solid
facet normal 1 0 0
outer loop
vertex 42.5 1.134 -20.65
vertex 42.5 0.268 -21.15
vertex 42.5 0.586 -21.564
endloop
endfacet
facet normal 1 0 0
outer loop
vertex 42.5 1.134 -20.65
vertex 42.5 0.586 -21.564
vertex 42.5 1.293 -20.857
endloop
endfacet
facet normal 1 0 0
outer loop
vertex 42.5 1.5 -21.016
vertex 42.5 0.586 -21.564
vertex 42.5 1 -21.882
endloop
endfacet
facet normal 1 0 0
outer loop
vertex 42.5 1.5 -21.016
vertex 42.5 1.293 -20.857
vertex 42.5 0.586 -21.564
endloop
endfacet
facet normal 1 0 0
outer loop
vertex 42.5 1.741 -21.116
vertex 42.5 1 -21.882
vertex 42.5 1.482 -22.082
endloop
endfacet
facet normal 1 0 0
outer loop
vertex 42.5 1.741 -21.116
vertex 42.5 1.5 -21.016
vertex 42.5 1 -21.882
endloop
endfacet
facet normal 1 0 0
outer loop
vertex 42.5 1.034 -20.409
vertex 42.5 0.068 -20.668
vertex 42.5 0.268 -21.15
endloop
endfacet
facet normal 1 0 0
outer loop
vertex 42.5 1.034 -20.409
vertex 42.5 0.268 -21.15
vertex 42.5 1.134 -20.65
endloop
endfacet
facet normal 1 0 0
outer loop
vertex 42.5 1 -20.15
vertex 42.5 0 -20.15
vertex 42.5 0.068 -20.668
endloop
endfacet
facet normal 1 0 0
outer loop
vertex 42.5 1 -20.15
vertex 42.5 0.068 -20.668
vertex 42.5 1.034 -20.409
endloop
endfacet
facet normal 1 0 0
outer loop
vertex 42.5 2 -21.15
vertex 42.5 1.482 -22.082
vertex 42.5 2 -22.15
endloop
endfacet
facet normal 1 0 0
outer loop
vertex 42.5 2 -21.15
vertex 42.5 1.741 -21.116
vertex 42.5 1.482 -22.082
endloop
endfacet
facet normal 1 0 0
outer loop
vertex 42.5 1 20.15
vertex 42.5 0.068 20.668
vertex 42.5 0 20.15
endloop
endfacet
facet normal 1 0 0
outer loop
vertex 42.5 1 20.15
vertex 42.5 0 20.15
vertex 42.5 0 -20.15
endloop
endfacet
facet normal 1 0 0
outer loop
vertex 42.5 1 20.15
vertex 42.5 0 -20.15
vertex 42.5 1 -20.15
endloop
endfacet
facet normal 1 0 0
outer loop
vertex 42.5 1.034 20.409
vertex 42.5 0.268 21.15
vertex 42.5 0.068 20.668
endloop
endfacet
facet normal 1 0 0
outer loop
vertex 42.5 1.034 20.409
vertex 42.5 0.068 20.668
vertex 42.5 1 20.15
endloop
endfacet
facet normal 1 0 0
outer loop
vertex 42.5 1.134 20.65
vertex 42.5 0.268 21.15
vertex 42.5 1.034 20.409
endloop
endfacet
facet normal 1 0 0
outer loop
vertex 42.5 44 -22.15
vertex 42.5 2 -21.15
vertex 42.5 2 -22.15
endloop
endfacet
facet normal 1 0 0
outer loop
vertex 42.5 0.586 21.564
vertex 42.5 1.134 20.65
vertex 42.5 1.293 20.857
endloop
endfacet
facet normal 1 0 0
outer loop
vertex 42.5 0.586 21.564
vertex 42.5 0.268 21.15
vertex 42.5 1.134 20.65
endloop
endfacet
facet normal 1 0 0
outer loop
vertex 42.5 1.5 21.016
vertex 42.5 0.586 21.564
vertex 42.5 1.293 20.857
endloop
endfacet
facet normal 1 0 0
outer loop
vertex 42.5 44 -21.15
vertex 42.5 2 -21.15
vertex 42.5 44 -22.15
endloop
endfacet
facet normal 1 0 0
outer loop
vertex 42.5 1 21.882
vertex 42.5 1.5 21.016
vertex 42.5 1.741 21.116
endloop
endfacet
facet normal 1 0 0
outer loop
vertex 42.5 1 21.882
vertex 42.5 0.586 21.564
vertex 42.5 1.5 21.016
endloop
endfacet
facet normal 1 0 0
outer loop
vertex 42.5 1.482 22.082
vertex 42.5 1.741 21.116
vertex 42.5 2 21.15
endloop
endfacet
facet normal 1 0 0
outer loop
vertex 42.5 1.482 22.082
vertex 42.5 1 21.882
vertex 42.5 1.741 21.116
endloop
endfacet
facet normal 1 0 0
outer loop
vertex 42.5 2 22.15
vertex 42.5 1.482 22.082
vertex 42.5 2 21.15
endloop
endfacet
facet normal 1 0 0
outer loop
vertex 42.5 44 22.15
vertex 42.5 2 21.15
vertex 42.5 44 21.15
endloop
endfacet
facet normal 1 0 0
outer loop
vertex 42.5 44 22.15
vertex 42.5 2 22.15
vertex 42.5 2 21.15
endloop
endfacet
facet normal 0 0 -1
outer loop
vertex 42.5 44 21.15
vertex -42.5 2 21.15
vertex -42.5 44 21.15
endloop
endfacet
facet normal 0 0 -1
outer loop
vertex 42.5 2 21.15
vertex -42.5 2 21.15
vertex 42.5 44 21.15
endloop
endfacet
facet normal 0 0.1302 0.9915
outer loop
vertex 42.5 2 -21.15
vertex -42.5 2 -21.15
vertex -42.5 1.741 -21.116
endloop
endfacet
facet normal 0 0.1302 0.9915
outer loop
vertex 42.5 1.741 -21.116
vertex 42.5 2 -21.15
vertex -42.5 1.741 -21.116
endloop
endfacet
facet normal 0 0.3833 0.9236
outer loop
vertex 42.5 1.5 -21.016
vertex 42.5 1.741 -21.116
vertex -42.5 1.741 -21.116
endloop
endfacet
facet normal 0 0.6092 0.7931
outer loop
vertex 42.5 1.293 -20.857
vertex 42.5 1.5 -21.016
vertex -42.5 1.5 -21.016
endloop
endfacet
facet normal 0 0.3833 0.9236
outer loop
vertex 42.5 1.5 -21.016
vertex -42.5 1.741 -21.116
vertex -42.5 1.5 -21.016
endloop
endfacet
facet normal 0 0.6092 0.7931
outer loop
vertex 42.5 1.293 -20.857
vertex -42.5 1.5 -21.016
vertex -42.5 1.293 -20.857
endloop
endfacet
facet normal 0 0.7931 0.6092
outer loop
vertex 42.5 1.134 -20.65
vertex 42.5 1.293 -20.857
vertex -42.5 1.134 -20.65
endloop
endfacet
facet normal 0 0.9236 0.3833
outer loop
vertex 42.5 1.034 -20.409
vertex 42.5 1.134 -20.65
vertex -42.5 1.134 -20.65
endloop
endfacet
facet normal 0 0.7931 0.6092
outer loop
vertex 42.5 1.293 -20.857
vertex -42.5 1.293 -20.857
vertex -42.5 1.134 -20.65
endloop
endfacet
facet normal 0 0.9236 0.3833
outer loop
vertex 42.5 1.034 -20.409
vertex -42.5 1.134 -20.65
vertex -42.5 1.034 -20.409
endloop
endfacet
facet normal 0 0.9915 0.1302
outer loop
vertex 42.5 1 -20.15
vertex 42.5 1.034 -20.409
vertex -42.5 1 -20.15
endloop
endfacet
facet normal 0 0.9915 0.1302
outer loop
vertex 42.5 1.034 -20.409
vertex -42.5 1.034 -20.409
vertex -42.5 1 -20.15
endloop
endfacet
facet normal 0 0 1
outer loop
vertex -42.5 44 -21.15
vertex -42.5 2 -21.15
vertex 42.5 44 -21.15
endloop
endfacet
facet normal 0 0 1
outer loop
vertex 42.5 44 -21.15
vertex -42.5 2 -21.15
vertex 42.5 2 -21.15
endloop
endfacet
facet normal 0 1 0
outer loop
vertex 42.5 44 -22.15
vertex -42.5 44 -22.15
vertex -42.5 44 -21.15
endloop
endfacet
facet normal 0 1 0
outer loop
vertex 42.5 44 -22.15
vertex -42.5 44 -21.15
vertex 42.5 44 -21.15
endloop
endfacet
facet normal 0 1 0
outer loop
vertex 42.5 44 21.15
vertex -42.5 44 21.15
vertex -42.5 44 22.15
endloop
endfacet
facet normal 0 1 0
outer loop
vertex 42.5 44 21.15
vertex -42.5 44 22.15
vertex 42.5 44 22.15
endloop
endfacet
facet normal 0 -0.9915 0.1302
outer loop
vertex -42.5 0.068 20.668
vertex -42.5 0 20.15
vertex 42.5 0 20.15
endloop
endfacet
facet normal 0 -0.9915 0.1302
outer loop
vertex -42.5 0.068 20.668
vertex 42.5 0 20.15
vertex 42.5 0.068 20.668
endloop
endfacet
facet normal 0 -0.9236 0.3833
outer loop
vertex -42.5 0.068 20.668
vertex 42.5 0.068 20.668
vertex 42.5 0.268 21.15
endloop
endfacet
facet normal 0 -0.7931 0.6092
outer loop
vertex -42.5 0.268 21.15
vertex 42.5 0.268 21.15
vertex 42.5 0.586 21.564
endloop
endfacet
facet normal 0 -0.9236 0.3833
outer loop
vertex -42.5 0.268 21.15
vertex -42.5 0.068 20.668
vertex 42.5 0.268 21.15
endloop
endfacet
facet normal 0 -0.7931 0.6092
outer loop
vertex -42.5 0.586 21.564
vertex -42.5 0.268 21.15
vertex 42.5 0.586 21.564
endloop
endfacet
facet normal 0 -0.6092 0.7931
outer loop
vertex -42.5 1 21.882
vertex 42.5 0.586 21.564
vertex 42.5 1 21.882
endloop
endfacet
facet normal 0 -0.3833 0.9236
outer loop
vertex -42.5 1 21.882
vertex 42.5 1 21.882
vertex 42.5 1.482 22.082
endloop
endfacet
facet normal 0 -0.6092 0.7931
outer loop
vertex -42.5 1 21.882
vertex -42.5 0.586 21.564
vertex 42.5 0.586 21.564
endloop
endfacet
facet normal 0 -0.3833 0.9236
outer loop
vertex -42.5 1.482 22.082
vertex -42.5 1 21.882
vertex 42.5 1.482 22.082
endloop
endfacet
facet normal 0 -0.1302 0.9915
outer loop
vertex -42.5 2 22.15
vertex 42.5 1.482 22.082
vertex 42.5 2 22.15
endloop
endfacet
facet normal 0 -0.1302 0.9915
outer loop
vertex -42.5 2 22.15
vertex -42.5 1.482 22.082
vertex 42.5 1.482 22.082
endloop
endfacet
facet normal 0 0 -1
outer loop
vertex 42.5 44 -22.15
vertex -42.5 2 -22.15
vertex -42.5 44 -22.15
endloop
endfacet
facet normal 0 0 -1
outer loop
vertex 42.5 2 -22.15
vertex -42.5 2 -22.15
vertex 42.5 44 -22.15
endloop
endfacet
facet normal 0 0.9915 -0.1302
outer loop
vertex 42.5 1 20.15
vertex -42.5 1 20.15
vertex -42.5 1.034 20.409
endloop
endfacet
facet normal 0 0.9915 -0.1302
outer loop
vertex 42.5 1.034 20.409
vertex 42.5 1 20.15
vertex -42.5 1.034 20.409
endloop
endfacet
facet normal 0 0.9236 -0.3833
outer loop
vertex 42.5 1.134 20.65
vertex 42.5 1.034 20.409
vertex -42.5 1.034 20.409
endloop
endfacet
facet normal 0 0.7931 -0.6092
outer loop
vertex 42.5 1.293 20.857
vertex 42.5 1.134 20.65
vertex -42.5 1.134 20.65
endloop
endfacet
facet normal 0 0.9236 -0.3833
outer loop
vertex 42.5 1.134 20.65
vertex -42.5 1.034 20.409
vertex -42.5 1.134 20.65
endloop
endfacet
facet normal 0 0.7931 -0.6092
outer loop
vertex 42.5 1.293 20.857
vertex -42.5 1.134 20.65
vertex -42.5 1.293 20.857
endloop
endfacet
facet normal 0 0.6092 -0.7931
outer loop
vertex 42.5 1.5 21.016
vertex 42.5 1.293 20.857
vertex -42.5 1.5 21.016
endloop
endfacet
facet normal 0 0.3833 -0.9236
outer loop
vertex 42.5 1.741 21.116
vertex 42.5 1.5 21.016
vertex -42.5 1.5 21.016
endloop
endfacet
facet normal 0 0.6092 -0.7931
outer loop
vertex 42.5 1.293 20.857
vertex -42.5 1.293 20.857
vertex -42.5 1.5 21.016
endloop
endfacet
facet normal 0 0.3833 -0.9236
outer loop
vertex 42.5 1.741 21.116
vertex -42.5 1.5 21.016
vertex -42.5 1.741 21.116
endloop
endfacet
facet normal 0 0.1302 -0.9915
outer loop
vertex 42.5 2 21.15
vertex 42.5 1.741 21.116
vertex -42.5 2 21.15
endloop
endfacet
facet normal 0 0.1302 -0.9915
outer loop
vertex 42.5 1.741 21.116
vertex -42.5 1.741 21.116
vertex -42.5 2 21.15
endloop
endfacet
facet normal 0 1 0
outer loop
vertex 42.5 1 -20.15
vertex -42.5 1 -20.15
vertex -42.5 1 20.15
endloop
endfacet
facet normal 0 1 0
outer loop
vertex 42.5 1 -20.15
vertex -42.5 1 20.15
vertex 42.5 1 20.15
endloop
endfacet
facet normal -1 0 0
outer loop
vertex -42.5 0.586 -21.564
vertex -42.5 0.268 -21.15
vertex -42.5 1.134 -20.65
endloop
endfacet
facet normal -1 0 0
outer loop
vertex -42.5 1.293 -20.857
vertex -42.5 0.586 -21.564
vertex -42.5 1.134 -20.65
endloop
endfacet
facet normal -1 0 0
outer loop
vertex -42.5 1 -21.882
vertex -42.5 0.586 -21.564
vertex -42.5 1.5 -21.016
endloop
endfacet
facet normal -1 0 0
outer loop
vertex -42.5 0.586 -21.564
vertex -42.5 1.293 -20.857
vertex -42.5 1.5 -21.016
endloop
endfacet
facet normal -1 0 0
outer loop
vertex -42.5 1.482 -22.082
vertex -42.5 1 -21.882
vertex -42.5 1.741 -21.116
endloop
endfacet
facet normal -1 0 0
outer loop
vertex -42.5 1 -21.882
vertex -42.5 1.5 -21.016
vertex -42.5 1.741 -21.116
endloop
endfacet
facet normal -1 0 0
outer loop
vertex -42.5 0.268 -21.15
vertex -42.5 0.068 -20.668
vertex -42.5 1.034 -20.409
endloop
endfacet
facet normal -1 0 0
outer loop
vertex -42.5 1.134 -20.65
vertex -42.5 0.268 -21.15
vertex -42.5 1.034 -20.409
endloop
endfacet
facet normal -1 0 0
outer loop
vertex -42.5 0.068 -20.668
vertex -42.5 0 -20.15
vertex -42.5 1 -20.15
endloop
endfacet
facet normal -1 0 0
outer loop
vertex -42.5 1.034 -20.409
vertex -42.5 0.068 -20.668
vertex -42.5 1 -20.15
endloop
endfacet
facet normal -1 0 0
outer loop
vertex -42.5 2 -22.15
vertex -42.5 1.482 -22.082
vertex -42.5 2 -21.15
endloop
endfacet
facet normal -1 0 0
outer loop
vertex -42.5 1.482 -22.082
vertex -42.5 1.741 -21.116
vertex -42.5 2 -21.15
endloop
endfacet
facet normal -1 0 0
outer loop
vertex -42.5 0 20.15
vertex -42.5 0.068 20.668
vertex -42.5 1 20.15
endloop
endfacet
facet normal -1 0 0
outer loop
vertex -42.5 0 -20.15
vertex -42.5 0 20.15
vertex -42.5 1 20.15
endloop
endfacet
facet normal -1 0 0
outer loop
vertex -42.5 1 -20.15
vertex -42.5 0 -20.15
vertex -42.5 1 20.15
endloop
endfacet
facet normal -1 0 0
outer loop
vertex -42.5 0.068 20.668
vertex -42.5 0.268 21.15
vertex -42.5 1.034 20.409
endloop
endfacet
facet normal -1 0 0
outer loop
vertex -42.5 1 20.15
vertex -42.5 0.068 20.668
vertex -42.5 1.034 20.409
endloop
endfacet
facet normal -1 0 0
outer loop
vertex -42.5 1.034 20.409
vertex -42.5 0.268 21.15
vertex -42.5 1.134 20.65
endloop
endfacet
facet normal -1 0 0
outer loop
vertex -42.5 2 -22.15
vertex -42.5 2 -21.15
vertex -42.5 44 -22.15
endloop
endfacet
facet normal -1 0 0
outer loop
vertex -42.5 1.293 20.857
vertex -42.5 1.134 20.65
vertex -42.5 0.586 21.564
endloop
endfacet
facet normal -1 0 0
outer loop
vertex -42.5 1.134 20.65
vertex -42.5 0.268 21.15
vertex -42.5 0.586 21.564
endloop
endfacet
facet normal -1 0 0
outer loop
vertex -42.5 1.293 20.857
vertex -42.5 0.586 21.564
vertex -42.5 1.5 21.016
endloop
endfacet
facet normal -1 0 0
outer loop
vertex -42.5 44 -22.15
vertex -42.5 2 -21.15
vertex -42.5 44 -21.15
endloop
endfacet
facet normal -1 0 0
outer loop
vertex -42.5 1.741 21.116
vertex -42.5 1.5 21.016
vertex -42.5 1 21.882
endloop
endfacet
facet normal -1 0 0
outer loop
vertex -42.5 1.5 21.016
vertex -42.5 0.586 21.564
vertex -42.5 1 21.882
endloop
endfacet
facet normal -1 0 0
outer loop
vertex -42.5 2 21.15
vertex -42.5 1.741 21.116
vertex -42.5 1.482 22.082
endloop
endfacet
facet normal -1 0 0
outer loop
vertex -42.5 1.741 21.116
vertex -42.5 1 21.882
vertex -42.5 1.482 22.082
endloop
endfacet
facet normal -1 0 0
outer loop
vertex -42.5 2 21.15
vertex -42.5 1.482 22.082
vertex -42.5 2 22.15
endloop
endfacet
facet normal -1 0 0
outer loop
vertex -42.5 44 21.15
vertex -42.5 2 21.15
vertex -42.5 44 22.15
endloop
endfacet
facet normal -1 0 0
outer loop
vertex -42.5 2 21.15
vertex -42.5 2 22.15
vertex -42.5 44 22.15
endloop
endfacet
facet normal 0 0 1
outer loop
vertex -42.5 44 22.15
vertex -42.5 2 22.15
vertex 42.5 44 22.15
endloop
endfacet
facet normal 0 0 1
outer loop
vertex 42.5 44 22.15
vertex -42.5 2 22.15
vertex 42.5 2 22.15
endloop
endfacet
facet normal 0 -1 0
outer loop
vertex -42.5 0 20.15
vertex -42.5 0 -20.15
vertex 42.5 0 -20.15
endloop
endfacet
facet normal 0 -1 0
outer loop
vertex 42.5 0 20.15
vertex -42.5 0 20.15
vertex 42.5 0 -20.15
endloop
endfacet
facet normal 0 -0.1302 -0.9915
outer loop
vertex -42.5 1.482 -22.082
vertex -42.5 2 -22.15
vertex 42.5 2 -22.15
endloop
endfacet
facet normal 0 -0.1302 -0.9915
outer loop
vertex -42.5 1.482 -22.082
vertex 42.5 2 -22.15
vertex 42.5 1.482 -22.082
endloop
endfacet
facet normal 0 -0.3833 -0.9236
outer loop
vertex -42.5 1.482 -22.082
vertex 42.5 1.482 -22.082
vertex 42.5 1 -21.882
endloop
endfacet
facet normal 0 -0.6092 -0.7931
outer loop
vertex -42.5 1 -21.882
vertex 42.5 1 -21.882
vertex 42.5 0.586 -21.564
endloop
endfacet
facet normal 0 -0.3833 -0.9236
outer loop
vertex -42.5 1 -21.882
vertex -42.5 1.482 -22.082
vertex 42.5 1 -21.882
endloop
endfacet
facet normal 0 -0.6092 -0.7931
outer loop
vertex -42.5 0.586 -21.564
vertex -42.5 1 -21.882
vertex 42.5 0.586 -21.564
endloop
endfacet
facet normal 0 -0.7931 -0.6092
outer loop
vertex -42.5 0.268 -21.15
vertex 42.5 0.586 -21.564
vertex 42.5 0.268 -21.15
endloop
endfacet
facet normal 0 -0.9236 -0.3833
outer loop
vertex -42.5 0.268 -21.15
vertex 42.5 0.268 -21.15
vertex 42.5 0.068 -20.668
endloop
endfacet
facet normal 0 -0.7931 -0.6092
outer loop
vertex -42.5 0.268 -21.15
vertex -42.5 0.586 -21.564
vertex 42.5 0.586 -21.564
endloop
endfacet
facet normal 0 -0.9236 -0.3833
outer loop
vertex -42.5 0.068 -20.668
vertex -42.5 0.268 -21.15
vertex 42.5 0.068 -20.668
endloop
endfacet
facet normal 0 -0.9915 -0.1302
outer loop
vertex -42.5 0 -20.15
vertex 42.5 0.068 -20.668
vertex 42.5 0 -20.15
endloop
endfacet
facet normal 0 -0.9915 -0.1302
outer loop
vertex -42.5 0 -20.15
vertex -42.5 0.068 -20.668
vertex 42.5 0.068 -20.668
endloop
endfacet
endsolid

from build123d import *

# Parameters (mm, degrees)
SZKIC2_W                    = 85
SZKIC2_H                    = 44.3
DODANIE_WYCI_GNI_CIE1_DEPTH = 1
SZKIC7_W                    = 85
SZKIC7_H                    = 1
DODANIE_WYCI_GNI_CIE2_DEPTH = 43
KONWERTUJ_START             = -42.5
KONWERTUJ_BRY_1_DEPTH       = 85
KONWERTUJ_BRY_1_2_DEPTH     = 85


# Read off the part's stored shape, not the designer's step: Konwertuj bryłę1
with BuildPart() as part:
    # Szkic2 → Dodanie-wyciągnięcie1 (new body)
    with BuildSketch(Plane(origin=(0, 0, 0), x_dir=(1, 0, 0), z_dir=(0, 1, 0))):
        Rectangle(SZKIC2_W, SZKIC2_H)
    extrude(amount=DODANIE_WYCI_GNI_CIE1_DEPTH)

    # Szkic7 → Dodanie-wyciągnięcie2 (add)
    with BuildSketch(Plane(origin=(0, 1, 0), x_dir=(1, 0, 0), z_dir=(0, 1, 0))):
        with Locations((0, 21.65)):
            Rectangle(SZKIC7_W, SZKIC7_H)
        with Locations((0, -21.65)):
            Rectangle(SZKIC7_W, SZKIC7_H)
    extrude(amount=DODANIE_WYCI_GNI_CIE2_DEPTH)

    # Konwertuj bryłę1 outline → Konwertuj bryłę1 (cut)
    with BuildSketch(Plane.YZ.offset(KONWERTUJ_START)):
        with BuildLine():
            ThreePointArc((2, -22.15), (0.585786438, -21.564213562), (0, -20.15))
            Line((0, -20.15), (0, -22.15))
            Line((0, -22.15), (2, -22.15))
        make_face()
        with BuildLine():
            ThreePointArc((0, 20.15), (0.585786438, 21.564213562), (2, 22.15))
            Line((2, 22.15), (0, 22.15))
            Line((0, 22.15), (0, 20.15))
        make_face()
    extrude(amount=KONWERTUJ_BRY_1_DEPTH, mode=Mode.SUBTRACT)

    # Konwertuj bry_1 2 outline → Konwertuj bry_1 2 (add)
    with BuildSketch(Plane.YZ.offset(KONWERTUJ_START)):
        with BuildLine():
            ThreePointArc((2, -21.15), (1.292893219, -20.857106781), (1, -20.15))
            Line((1, -20.15), (1, -21.15))
            Line((1, -21.15), (2, -21.15))
        make_face()
        with BuildLine():
            ThreePointArc((1, 20.15), (1.292893219, 20.857106781), (2, 21.15))
            Line((2, 21.15), (1, 21.15))
            Line((1, 21.15), (1, 20.15))
        make_face()
    extrude(amount=KONWERTUJ_BRY_1_2_DEPTH)


solid = part.part
